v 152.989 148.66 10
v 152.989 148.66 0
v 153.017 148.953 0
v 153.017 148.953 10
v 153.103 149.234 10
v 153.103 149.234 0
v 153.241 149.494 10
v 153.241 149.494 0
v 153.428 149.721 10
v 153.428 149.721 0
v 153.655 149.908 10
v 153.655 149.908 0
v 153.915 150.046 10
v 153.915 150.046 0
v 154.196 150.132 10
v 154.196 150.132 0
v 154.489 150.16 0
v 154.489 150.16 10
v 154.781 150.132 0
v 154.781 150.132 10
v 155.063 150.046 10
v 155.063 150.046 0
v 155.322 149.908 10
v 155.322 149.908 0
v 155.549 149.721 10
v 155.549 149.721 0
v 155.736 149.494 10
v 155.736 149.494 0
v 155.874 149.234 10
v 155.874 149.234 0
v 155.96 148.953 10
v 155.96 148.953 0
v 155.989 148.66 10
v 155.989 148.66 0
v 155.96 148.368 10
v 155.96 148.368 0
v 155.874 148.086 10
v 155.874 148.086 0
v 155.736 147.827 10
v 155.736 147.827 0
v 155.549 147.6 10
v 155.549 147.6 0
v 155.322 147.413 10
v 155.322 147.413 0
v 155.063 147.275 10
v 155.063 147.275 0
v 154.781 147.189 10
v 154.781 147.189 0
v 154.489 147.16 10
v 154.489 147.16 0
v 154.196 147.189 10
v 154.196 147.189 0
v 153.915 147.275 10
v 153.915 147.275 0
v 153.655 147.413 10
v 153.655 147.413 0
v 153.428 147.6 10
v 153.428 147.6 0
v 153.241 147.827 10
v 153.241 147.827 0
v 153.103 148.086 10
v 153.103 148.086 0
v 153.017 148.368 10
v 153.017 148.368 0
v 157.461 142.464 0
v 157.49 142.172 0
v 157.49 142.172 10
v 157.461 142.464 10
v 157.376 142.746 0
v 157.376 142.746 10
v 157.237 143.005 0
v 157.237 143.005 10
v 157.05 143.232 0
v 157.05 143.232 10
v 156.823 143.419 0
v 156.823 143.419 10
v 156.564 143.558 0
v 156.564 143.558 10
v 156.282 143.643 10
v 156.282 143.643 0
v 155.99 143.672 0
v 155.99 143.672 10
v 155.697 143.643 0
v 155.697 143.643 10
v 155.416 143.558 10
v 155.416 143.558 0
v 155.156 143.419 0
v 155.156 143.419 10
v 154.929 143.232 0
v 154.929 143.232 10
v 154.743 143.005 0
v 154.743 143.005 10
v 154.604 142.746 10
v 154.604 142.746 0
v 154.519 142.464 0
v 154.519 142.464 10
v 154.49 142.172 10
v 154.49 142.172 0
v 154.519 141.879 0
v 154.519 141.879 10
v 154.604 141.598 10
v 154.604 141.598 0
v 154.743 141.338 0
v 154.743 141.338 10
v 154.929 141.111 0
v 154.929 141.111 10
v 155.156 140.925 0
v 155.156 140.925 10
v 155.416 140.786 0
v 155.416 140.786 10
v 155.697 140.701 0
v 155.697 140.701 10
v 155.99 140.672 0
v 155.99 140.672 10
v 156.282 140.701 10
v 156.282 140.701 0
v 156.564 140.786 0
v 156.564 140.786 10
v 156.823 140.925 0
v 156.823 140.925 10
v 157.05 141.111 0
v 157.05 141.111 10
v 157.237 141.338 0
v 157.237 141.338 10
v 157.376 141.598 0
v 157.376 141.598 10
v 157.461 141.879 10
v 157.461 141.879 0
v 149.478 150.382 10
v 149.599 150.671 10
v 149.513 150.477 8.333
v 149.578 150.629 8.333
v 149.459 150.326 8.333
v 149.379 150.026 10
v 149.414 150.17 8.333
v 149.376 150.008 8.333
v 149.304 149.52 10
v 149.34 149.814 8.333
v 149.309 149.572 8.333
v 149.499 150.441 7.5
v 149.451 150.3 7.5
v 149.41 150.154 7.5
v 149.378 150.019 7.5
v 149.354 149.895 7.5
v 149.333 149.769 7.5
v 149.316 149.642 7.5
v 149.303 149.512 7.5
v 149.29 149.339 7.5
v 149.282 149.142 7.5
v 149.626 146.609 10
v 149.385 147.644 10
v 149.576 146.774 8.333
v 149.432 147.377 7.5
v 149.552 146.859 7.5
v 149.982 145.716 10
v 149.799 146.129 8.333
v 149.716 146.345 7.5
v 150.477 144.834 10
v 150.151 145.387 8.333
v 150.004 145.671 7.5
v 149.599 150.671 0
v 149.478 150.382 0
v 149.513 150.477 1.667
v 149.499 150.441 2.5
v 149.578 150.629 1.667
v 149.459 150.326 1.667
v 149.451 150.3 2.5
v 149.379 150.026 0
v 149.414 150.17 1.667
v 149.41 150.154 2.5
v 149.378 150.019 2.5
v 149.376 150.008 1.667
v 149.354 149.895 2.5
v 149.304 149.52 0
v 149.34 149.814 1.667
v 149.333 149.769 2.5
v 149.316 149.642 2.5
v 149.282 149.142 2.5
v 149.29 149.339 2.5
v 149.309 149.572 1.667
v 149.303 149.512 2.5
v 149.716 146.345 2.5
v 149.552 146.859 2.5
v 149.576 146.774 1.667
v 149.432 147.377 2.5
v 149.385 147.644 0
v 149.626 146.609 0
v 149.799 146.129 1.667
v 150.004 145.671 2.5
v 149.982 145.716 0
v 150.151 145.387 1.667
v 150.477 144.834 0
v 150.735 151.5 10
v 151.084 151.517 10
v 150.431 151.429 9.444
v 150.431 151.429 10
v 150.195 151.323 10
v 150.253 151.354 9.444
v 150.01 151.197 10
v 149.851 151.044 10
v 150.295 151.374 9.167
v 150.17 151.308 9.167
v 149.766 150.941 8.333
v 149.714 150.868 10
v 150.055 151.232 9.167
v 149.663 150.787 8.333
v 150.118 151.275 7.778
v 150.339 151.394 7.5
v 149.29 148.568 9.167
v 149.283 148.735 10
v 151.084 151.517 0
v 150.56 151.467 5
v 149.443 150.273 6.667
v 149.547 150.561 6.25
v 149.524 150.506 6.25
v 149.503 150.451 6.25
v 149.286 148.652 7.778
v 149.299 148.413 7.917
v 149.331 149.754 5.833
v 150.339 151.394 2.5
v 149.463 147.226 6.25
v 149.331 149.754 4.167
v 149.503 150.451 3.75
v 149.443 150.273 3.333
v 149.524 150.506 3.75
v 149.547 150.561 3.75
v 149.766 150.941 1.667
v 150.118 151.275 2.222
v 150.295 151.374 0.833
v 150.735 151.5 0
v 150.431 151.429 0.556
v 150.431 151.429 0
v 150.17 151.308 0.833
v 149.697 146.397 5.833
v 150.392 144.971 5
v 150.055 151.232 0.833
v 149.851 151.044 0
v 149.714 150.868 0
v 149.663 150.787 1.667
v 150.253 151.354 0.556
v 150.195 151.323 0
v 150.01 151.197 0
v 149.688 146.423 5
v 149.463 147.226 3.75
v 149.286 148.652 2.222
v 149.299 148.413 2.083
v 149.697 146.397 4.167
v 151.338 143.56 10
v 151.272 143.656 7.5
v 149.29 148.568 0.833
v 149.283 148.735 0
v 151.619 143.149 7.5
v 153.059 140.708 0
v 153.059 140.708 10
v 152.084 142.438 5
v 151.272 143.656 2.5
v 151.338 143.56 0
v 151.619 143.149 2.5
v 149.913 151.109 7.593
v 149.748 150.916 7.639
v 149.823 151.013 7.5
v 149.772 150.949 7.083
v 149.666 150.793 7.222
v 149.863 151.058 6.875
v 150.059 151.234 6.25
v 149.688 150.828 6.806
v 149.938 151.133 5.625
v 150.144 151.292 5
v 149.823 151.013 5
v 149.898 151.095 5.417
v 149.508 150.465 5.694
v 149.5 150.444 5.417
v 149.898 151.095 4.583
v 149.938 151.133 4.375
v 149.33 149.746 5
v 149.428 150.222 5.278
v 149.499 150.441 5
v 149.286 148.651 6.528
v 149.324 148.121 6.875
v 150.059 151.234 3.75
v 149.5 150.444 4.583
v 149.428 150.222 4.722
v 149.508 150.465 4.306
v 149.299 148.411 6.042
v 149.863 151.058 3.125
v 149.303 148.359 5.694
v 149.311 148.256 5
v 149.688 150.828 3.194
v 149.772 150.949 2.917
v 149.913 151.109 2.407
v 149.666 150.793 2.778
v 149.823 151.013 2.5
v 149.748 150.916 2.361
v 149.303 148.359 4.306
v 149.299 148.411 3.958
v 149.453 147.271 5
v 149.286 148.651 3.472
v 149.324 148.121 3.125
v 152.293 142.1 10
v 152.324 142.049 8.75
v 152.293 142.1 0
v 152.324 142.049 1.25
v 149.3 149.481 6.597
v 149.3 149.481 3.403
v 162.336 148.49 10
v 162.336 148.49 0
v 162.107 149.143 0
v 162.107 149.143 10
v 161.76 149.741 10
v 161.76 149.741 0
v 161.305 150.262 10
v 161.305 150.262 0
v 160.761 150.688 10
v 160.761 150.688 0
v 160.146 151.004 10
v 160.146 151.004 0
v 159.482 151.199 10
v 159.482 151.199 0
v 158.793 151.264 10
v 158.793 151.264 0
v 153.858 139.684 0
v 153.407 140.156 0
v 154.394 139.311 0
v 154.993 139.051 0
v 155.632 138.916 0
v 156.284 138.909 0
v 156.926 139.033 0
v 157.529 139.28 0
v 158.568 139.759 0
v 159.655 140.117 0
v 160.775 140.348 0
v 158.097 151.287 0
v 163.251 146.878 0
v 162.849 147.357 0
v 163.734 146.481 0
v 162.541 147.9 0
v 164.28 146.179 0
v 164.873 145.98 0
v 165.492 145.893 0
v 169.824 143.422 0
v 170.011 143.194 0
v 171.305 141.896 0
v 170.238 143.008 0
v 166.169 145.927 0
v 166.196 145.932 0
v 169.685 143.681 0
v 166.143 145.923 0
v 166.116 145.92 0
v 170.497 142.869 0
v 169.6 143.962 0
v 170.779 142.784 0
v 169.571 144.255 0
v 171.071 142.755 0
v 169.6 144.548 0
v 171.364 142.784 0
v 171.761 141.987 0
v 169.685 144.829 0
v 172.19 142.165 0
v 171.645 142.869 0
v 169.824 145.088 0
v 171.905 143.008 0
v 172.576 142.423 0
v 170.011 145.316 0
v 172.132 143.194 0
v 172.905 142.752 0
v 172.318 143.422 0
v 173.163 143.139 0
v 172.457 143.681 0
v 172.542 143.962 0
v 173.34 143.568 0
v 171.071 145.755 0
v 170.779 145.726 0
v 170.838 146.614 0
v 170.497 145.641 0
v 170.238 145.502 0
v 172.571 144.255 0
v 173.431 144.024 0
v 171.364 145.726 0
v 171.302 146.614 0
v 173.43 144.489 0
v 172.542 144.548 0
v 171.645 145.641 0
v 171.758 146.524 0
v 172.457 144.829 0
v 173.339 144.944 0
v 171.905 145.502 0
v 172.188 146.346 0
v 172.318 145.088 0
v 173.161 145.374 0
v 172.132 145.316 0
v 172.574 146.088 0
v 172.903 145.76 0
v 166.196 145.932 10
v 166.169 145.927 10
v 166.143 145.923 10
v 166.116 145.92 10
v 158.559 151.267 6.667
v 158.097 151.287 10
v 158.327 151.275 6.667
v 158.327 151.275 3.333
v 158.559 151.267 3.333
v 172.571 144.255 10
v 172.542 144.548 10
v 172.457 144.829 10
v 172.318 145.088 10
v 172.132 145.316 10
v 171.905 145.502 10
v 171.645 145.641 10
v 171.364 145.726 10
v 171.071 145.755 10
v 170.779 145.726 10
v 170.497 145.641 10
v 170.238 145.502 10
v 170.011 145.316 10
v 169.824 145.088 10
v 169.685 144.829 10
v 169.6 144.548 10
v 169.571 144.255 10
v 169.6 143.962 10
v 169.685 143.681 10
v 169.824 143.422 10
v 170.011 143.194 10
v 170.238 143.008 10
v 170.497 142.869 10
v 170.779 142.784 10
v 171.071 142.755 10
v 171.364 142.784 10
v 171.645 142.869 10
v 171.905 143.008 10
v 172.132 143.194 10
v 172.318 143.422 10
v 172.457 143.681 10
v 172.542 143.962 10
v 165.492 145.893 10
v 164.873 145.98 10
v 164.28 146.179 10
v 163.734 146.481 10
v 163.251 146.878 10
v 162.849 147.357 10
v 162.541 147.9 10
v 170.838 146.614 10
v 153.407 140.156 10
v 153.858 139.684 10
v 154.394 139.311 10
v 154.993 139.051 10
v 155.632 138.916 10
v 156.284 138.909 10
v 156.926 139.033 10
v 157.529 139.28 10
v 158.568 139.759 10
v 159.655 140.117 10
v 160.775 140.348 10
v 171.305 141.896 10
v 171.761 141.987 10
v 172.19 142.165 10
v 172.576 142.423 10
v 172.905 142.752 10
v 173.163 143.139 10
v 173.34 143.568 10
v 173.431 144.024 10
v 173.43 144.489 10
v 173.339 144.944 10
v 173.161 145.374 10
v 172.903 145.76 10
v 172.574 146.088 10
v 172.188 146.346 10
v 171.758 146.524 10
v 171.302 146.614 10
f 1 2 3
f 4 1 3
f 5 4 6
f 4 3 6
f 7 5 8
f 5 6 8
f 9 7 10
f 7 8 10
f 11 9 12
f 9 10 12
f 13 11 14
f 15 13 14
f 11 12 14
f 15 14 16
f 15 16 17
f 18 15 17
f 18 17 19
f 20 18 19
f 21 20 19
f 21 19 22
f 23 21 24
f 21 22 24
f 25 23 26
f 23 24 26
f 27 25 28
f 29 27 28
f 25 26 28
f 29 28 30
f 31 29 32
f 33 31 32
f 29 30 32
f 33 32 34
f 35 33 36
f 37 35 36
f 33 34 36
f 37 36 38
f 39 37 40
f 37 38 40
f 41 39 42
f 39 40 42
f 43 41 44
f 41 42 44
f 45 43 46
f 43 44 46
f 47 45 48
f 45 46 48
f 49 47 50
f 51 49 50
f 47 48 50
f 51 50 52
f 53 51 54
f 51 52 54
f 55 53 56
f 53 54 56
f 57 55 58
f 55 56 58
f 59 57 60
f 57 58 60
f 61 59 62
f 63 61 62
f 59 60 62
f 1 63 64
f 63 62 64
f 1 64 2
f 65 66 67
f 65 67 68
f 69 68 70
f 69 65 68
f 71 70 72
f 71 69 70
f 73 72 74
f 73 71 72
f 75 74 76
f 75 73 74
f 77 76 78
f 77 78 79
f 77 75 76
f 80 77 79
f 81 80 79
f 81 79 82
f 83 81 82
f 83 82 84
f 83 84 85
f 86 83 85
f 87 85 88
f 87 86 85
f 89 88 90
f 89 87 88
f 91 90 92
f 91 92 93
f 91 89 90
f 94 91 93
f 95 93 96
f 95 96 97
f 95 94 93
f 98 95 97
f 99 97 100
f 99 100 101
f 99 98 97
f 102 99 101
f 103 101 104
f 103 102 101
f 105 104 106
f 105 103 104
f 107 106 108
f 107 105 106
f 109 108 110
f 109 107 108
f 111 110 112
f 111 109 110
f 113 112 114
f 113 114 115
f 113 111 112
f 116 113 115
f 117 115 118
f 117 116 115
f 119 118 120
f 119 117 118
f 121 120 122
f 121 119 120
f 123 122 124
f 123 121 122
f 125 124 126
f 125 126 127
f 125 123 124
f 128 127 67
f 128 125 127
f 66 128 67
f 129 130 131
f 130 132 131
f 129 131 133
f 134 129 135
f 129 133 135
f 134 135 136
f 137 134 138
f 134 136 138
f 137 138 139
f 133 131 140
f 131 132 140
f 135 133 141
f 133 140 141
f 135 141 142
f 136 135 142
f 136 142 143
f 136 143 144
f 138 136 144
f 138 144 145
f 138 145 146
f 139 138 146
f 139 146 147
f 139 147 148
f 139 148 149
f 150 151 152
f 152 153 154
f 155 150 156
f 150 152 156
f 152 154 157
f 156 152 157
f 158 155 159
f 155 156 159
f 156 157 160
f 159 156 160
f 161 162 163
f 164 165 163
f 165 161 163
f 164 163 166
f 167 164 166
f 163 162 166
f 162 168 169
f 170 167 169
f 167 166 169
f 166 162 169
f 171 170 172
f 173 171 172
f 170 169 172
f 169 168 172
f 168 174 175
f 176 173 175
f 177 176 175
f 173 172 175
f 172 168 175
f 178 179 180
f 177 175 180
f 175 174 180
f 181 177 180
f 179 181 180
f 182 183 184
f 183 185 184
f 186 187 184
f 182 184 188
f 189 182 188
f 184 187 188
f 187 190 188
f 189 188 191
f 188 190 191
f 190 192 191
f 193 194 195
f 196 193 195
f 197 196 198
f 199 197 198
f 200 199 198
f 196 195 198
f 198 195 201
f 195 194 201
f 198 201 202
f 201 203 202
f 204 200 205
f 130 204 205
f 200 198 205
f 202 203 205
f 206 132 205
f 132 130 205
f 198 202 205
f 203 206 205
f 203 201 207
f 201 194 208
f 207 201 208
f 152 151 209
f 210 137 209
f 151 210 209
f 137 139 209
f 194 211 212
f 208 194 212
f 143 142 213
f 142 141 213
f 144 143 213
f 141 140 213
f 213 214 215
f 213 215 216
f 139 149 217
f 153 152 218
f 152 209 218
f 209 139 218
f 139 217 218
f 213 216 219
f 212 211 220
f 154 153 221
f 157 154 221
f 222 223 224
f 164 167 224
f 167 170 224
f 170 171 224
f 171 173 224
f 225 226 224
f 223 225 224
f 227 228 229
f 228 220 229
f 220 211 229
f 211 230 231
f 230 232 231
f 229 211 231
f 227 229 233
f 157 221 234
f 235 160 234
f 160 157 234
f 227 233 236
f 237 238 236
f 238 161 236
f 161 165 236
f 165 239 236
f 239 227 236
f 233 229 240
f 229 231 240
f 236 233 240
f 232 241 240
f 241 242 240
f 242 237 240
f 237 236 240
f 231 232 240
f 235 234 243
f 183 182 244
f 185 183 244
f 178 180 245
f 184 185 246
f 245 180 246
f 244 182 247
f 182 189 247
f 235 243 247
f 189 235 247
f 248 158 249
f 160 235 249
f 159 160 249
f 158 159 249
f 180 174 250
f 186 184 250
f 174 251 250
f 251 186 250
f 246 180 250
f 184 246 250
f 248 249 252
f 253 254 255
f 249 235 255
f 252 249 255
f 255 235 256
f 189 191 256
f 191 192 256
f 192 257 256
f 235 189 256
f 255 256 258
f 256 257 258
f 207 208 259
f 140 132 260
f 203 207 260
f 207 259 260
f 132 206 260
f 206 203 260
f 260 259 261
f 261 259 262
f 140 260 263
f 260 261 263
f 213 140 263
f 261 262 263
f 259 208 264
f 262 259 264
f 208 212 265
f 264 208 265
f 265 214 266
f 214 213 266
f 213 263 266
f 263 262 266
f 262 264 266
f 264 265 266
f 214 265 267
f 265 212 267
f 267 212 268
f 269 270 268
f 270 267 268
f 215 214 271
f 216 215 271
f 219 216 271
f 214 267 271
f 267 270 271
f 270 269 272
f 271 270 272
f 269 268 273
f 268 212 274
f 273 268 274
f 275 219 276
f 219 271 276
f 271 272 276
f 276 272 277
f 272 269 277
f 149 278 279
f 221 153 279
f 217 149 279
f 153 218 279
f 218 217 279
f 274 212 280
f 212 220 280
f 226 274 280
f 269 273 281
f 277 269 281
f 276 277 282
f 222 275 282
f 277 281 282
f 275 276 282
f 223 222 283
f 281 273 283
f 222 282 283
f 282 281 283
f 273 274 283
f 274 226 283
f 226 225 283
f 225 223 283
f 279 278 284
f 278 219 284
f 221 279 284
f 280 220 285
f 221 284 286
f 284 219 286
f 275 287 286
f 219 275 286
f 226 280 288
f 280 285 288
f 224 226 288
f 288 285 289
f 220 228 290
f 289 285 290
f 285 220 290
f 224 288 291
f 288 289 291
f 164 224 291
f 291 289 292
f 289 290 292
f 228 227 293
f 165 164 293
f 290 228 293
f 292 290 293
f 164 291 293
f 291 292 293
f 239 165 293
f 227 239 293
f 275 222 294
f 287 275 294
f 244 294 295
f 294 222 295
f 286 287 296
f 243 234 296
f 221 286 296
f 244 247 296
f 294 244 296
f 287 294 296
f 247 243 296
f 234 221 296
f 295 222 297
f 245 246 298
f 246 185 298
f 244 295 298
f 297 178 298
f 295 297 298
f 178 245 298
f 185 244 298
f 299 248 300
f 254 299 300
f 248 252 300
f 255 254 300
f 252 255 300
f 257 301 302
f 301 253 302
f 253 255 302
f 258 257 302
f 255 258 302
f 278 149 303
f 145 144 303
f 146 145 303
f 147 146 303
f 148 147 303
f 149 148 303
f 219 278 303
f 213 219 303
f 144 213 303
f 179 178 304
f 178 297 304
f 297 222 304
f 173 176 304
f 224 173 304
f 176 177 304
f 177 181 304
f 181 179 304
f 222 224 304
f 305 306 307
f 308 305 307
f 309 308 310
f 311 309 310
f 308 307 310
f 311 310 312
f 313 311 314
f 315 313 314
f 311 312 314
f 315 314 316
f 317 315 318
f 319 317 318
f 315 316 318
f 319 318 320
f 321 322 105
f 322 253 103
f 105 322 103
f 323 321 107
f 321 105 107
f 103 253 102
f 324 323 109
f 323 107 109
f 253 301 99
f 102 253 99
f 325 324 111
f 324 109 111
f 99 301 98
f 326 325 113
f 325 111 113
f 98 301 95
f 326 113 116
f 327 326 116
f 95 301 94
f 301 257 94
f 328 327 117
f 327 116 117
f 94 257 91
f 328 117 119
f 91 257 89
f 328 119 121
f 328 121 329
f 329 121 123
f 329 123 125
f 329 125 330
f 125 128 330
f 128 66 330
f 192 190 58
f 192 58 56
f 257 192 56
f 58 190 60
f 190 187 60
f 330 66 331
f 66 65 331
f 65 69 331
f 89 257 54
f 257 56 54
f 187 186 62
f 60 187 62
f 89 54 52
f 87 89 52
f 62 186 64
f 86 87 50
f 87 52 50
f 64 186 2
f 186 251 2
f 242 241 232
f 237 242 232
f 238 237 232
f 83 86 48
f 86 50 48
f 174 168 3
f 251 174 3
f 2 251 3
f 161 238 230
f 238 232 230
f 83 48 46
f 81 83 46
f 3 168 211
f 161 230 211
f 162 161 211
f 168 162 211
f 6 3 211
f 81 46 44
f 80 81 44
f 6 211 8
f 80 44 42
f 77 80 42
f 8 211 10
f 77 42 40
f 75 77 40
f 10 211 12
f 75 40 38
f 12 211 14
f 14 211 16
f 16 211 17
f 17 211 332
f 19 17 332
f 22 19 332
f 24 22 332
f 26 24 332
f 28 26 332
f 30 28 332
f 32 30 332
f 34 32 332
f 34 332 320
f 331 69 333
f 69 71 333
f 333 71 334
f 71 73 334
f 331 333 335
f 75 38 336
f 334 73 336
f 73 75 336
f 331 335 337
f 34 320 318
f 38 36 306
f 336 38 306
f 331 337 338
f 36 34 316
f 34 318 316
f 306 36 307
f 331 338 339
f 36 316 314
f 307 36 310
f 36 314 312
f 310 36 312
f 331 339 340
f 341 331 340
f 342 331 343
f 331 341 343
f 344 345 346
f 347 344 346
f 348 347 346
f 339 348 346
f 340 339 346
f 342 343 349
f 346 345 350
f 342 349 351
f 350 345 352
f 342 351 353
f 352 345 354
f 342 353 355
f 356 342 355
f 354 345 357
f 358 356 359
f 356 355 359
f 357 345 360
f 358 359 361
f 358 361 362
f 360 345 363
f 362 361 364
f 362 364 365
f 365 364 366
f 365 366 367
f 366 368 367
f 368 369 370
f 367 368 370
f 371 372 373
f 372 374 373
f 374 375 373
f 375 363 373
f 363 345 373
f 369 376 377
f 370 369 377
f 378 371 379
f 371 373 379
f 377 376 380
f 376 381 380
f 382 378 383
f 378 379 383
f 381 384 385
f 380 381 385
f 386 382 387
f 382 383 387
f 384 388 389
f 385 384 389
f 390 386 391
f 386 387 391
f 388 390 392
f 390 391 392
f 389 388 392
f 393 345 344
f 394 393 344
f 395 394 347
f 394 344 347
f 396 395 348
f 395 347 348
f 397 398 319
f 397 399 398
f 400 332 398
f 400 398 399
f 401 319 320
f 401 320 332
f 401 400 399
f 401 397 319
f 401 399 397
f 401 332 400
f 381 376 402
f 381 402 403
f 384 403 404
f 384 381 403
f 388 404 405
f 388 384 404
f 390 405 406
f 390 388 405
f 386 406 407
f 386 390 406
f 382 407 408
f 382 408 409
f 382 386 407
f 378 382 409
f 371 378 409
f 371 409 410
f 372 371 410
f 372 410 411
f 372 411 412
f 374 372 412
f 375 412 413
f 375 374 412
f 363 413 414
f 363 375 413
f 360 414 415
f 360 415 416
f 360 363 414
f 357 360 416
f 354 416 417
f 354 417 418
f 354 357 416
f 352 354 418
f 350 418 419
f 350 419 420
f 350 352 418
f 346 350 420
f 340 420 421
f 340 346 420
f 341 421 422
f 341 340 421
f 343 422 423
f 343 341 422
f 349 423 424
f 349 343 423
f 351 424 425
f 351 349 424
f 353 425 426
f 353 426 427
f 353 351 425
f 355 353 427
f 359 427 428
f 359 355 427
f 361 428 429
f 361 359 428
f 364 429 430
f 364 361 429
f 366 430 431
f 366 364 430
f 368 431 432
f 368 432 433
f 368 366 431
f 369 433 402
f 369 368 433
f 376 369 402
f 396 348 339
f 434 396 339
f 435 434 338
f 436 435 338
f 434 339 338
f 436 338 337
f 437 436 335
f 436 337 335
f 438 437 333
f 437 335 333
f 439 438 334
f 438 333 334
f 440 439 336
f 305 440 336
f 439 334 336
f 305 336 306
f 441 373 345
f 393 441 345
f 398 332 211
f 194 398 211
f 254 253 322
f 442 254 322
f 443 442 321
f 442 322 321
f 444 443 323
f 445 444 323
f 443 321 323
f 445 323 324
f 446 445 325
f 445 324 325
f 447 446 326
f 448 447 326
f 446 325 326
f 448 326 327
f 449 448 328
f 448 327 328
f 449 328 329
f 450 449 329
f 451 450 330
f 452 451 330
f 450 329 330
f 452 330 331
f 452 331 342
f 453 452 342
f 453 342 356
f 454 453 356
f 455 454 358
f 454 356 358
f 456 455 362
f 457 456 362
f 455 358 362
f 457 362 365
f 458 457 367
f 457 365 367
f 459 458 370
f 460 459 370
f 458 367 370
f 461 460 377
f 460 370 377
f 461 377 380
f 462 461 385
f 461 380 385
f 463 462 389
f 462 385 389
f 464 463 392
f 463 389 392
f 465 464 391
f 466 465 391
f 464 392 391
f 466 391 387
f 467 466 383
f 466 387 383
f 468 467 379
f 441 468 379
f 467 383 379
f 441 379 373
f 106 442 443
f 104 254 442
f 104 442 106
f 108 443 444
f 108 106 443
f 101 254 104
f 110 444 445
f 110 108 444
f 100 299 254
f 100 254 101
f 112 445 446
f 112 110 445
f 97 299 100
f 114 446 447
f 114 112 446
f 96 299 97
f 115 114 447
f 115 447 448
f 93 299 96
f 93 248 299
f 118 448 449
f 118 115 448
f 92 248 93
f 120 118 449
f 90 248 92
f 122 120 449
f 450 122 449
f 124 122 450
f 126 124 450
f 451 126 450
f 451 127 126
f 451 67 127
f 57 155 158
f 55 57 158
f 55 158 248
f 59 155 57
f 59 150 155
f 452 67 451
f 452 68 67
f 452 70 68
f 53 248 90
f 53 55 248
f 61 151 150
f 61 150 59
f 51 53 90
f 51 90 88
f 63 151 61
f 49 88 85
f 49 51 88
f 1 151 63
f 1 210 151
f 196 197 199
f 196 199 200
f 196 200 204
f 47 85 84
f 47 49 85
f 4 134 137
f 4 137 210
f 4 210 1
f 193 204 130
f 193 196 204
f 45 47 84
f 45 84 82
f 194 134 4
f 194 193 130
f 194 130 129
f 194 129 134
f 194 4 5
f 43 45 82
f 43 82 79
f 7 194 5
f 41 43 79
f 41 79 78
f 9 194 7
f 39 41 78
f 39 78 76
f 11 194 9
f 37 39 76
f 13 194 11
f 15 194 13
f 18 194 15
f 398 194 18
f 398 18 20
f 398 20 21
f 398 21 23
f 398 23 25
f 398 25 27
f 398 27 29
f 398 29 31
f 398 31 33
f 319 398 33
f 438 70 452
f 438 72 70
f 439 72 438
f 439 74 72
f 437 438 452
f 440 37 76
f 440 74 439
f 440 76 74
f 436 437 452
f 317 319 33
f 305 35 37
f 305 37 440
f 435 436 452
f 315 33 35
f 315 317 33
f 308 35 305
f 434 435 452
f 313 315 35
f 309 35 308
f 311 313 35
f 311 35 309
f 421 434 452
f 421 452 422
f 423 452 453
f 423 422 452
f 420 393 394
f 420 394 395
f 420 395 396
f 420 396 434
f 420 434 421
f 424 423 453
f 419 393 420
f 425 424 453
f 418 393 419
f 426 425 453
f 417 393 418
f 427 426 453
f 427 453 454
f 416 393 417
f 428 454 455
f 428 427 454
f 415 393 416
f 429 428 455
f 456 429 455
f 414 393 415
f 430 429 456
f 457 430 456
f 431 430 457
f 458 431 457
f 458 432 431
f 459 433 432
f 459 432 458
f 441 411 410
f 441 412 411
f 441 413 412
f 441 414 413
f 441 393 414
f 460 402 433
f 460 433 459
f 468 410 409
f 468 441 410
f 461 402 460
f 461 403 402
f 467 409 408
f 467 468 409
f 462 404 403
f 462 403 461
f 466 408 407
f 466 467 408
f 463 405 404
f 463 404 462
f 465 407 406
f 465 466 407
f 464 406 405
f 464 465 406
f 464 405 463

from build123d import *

# Parameters (mm, degrees)
ESQUISSE1_R             = 1.5
BOSS_EXTRU_1_DEPTH      = 10
ESQUISSE4_R             = 1.5
ENL_V_MAT_EXTRU_1_DEPTH = 10


with BuildPart() as part:
    # Esquisse1 → Boss.-Extru.1 (new body)
    with BuildSketch(Plane.XY):
        with BuildLine():
            ThreePointArc((166.196116566, 145.931525385), (166.155979782, 145.925380319), (166.115772908, 145.919711933))
            ThreePointArc((166.115772908, 145.919711933), (163.733808584, 146.481340732), (162.336090633, 148.490212425))
            ThreePointArc((162.336090633, 148.490212425), (161.043135484, 150.488209055), (158.793350908, 151.264219956))
            add(Edge.make_bspline(
                [(158.097461395, 151.287034218), (158.325870367, 151.272612558), (158.557802913, 151.264219956), (158.793350908, 151.264219956)],
                knots=[0.972871192, 0.972871192, 0.972871192, 0.972871192, 1, 1, 1, 1], degree=3))
            Line((158.097461395, 151.287034218), (151.083645878, 151.516977361))
            add(Edge.make_bspline(
                [(151.083645878, 151.516977361), (149.342529168, 151.574058681), (148.84170313, 145.368566224), (151.28409597, 144.26310725), (153.059001839, 140.708421316)],
                knots=[0, 0, 0, 0, 0.305758731, 1, 1, 1, 1], degree=3))
            ThreePointArc((153.059001839, 140.708421316), (154.992982473, 139.051339554), (157.529461725, 139.280411726))
            ThreePointArc((157.529461725, 139.280411726), (159.106326045, 139.953593423), (160.77500835, 140.347514793))
            Line((160.77500835, 140.347514793), (171.304889346, 141.895791964))
            ThreePointArc((171.304889346, 141.895791964), (173.430316642, 144.488558391), (170.837550215, 146.613985687))
            Line((170.837550215, 146.613985687), (166.196116566, 145.931525385))
        make_face()
        with Locations((155.989754872, 142.171788504)):
            Circle(ESQUISSE1_R, mode=Mode.SUBTRACT)
        with Locations((171.07121978, 144.254888826)):
            Circle(ESQUISSE1_R, mode=Mode.SUBTRACT)
    extrude(amount=BOSS_EXTRU_1_DEPTH)

    # Esquisse4 → Enlèv. mat.-Extru.1 (cut)
    with BuildSketch(Plane(origin=(0, 0, 0), x_dir=(-1, 0, 0), z_dir=(0, 0, -1))):
        with Locations((-154.488550327, 148.660392739)):
            Circle(ESQUISSE4_R)
    extrude(amount=-ENL_V_MAT_EXTRU_1_DEPTH, mode=Mode.SUBTRACT)


solid = part.part
